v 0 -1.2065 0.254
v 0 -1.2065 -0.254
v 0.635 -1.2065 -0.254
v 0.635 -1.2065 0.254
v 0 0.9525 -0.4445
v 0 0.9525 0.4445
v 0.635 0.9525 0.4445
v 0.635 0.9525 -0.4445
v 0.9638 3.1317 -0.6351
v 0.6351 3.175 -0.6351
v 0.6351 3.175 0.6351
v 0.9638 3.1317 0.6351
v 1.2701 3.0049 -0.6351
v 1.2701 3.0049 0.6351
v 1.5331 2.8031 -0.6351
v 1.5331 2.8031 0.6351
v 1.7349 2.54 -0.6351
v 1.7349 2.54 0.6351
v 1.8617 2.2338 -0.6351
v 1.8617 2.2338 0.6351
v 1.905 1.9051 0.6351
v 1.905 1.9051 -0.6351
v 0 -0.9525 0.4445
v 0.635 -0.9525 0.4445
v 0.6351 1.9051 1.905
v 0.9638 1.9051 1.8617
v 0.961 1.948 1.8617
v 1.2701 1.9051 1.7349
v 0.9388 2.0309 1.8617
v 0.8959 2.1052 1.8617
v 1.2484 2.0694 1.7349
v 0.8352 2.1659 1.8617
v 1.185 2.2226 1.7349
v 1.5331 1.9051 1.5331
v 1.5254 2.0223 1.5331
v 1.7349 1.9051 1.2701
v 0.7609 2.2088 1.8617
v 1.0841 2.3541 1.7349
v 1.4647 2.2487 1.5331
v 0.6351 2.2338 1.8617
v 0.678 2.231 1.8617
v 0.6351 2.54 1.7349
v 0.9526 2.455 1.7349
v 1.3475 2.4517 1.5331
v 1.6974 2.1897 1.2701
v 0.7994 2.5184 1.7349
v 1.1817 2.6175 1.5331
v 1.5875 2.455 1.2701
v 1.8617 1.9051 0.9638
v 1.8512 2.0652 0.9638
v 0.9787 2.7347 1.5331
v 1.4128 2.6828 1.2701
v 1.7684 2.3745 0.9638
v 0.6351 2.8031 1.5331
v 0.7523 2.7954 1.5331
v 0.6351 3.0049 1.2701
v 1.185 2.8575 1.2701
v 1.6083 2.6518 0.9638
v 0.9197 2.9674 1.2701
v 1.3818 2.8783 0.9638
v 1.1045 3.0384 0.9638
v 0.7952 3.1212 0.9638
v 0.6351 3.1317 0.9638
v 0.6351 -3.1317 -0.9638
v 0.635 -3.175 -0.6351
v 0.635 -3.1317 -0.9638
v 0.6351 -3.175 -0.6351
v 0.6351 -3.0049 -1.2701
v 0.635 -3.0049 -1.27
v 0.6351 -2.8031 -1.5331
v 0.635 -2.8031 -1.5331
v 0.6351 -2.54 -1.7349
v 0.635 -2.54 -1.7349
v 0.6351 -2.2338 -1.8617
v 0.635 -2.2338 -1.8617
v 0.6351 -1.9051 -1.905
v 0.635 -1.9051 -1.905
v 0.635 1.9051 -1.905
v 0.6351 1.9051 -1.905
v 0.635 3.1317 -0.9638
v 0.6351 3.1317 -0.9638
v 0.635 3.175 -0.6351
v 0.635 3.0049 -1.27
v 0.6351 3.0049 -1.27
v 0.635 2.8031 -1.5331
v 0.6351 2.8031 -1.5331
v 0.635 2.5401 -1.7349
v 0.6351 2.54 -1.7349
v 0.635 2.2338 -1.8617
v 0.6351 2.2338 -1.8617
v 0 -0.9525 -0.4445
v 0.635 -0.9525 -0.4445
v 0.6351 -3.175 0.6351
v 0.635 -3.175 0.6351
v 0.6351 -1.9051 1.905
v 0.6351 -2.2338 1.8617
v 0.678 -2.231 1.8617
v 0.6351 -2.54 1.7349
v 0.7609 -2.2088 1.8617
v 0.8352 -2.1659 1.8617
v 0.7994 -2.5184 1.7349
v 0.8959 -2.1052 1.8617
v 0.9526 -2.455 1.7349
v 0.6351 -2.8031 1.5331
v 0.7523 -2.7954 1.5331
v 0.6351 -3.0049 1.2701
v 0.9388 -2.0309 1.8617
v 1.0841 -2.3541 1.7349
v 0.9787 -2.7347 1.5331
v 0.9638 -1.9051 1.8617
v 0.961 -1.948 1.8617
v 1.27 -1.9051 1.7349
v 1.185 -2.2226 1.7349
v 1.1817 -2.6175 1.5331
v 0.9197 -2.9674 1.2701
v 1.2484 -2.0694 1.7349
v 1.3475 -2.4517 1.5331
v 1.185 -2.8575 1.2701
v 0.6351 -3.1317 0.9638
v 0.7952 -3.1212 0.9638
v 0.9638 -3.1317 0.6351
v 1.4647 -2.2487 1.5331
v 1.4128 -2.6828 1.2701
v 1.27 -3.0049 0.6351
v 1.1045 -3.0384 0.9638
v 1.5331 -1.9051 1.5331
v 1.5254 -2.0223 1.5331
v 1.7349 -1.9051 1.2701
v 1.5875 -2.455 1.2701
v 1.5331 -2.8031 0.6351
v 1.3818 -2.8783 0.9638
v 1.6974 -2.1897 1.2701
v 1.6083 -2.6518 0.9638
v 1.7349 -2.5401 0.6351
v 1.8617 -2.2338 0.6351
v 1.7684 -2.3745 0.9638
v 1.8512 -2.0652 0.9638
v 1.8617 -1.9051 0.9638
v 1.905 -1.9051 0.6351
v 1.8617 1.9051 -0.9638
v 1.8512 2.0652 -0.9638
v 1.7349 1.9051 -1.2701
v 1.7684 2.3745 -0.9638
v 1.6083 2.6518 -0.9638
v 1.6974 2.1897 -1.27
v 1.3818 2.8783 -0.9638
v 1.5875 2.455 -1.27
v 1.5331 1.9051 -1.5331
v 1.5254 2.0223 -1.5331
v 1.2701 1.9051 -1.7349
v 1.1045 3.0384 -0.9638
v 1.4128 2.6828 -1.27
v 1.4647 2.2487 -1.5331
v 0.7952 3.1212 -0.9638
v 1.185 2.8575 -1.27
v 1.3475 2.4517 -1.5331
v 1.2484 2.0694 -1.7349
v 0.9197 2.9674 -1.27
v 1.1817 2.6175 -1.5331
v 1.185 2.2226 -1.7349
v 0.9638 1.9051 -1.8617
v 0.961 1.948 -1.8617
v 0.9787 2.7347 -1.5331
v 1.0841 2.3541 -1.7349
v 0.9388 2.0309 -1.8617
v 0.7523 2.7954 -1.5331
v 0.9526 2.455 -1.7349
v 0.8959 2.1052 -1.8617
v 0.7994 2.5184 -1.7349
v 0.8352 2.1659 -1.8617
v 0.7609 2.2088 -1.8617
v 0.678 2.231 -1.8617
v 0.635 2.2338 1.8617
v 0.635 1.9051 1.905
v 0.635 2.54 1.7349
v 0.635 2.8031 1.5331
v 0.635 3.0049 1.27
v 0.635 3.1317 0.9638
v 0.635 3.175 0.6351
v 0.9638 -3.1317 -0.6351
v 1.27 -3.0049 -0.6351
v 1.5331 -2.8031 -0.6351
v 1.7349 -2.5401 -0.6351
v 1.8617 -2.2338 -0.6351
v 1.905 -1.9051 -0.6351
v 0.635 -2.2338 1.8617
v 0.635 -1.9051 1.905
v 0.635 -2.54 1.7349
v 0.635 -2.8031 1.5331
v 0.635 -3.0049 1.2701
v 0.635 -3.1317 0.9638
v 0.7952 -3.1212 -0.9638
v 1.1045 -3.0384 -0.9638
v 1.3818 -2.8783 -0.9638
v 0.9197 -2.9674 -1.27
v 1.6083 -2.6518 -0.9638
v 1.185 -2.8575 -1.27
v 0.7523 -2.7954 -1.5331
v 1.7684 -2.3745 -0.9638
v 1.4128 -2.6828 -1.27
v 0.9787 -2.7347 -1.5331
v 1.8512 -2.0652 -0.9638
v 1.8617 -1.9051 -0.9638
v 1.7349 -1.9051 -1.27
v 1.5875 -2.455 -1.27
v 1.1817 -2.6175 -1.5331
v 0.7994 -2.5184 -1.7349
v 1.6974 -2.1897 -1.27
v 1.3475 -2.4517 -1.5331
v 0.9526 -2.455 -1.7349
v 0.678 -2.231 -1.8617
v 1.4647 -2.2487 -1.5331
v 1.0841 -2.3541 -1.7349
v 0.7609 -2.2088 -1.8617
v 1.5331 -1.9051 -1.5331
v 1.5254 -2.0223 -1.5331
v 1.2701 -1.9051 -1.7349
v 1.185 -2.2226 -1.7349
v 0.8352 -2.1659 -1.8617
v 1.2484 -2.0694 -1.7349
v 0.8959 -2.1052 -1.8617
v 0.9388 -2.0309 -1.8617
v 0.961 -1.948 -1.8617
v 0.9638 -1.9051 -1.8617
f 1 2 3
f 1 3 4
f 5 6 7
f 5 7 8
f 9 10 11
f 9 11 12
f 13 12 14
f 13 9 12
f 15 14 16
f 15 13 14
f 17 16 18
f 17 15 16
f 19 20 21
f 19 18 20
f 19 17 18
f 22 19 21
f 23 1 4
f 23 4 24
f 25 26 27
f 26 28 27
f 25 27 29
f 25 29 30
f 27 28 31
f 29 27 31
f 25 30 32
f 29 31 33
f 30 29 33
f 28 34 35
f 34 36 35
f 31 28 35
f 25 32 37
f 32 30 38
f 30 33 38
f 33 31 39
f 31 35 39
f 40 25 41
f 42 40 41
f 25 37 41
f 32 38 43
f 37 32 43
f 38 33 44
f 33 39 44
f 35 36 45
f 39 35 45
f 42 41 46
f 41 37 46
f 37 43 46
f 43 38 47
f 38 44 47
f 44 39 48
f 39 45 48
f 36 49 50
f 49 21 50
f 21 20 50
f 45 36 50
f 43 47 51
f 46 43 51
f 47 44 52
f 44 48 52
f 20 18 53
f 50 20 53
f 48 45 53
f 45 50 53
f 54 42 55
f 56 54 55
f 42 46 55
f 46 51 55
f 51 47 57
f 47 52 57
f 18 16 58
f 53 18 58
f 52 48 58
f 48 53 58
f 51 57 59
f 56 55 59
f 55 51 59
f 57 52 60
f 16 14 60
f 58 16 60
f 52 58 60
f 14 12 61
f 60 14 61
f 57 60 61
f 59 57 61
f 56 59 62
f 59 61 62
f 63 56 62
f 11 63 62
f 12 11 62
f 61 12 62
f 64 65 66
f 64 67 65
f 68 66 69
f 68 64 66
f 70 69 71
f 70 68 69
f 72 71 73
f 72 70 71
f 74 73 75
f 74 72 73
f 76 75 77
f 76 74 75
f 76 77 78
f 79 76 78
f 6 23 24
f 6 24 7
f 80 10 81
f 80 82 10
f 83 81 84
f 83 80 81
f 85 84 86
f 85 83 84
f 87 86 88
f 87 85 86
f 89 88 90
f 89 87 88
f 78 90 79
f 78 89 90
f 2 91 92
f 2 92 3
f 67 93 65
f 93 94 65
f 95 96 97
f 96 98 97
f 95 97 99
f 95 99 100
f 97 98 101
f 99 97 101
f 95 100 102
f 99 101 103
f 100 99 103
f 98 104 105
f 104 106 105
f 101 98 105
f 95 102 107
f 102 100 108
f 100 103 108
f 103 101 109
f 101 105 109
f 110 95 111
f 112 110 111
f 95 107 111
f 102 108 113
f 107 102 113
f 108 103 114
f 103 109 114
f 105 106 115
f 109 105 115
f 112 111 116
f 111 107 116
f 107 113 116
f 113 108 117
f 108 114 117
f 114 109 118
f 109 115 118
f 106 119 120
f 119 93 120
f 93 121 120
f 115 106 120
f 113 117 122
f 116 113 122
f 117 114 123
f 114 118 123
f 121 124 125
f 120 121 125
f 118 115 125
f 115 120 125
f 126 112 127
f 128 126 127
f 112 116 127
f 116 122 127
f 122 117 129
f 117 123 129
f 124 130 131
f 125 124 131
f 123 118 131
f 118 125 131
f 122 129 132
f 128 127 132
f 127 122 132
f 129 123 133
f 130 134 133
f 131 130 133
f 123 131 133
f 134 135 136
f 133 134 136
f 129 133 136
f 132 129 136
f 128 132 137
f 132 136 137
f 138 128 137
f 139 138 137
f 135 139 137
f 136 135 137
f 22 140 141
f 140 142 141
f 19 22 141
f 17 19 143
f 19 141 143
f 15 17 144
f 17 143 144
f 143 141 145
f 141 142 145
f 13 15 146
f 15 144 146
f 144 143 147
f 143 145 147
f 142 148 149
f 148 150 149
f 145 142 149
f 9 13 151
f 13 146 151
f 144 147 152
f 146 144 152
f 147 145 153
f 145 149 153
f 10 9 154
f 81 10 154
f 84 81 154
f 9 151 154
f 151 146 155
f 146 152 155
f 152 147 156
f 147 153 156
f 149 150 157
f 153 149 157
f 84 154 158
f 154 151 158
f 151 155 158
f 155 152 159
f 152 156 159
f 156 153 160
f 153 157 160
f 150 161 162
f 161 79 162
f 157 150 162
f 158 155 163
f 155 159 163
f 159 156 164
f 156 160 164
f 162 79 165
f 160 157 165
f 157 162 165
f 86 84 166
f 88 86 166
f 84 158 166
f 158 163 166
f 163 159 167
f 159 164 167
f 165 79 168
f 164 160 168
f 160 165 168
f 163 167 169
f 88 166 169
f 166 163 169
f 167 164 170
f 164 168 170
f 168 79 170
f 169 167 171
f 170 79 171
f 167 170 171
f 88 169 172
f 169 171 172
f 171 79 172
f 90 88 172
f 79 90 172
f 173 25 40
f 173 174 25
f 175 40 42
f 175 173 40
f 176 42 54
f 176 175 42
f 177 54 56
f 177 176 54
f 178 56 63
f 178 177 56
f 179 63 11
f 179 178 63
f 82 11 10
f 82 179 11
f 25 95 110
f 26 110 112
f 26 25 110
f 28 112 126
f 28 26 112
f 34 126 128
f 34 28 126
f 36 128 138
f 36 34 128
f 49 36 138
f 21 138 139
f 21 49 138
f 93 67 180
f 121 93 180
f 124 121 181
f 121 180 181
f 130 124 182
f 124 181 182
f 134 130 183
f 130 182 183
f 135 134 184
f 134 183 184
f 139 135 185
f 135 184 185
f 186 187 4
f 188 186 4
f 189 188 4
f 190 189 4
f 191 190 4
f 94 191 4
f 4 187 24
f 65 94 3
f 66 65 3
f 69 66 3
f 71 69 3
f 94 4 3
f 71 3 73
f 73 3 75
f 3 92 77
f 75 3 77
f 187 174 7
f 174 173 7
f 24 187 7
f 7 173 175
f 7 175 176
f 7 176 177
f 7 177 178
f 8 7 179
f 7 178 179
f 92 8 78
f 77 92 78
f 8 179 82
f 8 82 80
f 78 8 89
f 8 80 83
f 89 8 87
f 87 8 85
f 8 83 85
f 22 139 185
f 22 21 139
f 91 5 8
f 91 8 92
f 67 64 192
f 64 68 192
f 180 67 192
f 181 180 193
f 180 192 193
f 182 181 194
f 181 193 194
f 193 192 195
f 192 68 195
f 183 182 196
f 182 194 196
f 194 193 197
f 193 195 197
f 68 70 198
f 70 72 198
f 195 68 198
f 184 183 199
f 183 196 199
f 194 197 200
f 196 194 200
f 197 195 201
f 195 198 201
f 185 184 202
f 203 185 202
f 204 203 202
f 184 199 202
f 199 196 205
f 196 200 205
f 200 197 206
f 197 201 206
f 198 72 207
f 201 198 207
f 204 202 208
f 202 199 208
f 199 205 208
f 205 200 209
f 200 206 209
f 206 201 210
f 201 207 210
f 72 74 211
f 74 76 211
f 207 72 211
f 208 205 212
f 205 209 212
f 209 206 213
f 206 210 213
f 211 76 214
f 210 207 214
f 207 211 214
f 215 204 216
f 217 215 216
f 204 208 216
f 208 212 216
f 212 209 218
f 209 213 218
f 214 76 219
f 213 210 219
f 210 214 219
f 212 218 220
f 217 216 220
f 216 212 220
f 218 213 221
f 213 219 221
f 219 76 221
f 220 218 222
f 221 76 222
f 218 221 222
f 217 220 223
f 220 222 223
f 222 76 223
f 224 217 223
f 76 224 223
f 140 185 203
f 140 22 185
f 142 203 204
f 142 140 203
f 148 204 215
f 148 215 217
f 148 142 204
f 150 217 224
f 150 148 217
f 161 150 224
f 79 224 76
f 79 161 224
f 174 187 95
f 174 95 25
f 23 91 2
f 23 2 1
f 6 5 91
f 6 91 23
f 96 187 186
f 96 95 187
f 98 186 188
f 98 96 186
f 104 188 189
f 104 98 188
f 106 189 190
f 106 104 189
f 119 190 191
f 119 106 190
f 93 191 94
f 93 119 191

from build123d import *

# Parameters (mm, degrees)
BOSS_EXTRUDE1_DEPTH = 0.635
SKETCH2_W           = 3.81
SKETCH2_H           = 6.35
BOSS_EXTRUDE2_DEPTH = 1.27
FILLET4_R           = 1.27
FILLET5_R           = 1.27


with BuildPart() as part:
    # Sketch1 → Boss-Extrude1 (new body)
    with BuildSketch(Plane(origin=(0, 0, 0), x_dir=(0, 0, -1), z_dir=(1, 0, 0))):
        Polygon((-0.4445, 0.9525), (0.4445, 0.9525), (0.4445, -0.9525), (0.254, -1.2065), (-0.254, -1.2065), (-0.4445, -0.9525), align=None)
    extrude(amount=BOSS_EXTRUDE1_DEPTH)

    # Sketch2 → Boss-Extrude2 (add)
    with BuildSketch(Plane(origin=(0.635, 0, 0), x_dir=(0, 0, -1), z_dir=(1, 0, 0))):
        Rectangle(SKETCH2_W, SKETCH2_H)
    extrude(amount=BOSS_EXTRUDE2_DEPTH)

    # Fillet4
    fillet4_edges = [part.edges().sort_by_distance(p)[0] for p in [
        (1.905, -3.175, 0),
        (1.905, 3.175, 0),
    ]]
    fillet(fillet4_edges, radius=FILLET4_R - 0.0001)  # a hair under: the kernel refuses the full size

    # Fillet5
    fillet5_edges = [part.edges().sort_by_distance(p)[0] for p in [
        (1.905, 0, -1.905),
        (1.905, 0, 1.905),
        (1.533054901, 2.803054901, -1.905),
        (1.533054901, -2.803054901, -1.905),
        (1.533054901, 2.803054901, 1.905),
        (1.533054901, -2.803054901, 1.905),
    ]]
    fillet(fillet5_edges, radius=FILLET5_R - 0.0001)  # a hair under: the kernel refuses the full size


solid = part.part
